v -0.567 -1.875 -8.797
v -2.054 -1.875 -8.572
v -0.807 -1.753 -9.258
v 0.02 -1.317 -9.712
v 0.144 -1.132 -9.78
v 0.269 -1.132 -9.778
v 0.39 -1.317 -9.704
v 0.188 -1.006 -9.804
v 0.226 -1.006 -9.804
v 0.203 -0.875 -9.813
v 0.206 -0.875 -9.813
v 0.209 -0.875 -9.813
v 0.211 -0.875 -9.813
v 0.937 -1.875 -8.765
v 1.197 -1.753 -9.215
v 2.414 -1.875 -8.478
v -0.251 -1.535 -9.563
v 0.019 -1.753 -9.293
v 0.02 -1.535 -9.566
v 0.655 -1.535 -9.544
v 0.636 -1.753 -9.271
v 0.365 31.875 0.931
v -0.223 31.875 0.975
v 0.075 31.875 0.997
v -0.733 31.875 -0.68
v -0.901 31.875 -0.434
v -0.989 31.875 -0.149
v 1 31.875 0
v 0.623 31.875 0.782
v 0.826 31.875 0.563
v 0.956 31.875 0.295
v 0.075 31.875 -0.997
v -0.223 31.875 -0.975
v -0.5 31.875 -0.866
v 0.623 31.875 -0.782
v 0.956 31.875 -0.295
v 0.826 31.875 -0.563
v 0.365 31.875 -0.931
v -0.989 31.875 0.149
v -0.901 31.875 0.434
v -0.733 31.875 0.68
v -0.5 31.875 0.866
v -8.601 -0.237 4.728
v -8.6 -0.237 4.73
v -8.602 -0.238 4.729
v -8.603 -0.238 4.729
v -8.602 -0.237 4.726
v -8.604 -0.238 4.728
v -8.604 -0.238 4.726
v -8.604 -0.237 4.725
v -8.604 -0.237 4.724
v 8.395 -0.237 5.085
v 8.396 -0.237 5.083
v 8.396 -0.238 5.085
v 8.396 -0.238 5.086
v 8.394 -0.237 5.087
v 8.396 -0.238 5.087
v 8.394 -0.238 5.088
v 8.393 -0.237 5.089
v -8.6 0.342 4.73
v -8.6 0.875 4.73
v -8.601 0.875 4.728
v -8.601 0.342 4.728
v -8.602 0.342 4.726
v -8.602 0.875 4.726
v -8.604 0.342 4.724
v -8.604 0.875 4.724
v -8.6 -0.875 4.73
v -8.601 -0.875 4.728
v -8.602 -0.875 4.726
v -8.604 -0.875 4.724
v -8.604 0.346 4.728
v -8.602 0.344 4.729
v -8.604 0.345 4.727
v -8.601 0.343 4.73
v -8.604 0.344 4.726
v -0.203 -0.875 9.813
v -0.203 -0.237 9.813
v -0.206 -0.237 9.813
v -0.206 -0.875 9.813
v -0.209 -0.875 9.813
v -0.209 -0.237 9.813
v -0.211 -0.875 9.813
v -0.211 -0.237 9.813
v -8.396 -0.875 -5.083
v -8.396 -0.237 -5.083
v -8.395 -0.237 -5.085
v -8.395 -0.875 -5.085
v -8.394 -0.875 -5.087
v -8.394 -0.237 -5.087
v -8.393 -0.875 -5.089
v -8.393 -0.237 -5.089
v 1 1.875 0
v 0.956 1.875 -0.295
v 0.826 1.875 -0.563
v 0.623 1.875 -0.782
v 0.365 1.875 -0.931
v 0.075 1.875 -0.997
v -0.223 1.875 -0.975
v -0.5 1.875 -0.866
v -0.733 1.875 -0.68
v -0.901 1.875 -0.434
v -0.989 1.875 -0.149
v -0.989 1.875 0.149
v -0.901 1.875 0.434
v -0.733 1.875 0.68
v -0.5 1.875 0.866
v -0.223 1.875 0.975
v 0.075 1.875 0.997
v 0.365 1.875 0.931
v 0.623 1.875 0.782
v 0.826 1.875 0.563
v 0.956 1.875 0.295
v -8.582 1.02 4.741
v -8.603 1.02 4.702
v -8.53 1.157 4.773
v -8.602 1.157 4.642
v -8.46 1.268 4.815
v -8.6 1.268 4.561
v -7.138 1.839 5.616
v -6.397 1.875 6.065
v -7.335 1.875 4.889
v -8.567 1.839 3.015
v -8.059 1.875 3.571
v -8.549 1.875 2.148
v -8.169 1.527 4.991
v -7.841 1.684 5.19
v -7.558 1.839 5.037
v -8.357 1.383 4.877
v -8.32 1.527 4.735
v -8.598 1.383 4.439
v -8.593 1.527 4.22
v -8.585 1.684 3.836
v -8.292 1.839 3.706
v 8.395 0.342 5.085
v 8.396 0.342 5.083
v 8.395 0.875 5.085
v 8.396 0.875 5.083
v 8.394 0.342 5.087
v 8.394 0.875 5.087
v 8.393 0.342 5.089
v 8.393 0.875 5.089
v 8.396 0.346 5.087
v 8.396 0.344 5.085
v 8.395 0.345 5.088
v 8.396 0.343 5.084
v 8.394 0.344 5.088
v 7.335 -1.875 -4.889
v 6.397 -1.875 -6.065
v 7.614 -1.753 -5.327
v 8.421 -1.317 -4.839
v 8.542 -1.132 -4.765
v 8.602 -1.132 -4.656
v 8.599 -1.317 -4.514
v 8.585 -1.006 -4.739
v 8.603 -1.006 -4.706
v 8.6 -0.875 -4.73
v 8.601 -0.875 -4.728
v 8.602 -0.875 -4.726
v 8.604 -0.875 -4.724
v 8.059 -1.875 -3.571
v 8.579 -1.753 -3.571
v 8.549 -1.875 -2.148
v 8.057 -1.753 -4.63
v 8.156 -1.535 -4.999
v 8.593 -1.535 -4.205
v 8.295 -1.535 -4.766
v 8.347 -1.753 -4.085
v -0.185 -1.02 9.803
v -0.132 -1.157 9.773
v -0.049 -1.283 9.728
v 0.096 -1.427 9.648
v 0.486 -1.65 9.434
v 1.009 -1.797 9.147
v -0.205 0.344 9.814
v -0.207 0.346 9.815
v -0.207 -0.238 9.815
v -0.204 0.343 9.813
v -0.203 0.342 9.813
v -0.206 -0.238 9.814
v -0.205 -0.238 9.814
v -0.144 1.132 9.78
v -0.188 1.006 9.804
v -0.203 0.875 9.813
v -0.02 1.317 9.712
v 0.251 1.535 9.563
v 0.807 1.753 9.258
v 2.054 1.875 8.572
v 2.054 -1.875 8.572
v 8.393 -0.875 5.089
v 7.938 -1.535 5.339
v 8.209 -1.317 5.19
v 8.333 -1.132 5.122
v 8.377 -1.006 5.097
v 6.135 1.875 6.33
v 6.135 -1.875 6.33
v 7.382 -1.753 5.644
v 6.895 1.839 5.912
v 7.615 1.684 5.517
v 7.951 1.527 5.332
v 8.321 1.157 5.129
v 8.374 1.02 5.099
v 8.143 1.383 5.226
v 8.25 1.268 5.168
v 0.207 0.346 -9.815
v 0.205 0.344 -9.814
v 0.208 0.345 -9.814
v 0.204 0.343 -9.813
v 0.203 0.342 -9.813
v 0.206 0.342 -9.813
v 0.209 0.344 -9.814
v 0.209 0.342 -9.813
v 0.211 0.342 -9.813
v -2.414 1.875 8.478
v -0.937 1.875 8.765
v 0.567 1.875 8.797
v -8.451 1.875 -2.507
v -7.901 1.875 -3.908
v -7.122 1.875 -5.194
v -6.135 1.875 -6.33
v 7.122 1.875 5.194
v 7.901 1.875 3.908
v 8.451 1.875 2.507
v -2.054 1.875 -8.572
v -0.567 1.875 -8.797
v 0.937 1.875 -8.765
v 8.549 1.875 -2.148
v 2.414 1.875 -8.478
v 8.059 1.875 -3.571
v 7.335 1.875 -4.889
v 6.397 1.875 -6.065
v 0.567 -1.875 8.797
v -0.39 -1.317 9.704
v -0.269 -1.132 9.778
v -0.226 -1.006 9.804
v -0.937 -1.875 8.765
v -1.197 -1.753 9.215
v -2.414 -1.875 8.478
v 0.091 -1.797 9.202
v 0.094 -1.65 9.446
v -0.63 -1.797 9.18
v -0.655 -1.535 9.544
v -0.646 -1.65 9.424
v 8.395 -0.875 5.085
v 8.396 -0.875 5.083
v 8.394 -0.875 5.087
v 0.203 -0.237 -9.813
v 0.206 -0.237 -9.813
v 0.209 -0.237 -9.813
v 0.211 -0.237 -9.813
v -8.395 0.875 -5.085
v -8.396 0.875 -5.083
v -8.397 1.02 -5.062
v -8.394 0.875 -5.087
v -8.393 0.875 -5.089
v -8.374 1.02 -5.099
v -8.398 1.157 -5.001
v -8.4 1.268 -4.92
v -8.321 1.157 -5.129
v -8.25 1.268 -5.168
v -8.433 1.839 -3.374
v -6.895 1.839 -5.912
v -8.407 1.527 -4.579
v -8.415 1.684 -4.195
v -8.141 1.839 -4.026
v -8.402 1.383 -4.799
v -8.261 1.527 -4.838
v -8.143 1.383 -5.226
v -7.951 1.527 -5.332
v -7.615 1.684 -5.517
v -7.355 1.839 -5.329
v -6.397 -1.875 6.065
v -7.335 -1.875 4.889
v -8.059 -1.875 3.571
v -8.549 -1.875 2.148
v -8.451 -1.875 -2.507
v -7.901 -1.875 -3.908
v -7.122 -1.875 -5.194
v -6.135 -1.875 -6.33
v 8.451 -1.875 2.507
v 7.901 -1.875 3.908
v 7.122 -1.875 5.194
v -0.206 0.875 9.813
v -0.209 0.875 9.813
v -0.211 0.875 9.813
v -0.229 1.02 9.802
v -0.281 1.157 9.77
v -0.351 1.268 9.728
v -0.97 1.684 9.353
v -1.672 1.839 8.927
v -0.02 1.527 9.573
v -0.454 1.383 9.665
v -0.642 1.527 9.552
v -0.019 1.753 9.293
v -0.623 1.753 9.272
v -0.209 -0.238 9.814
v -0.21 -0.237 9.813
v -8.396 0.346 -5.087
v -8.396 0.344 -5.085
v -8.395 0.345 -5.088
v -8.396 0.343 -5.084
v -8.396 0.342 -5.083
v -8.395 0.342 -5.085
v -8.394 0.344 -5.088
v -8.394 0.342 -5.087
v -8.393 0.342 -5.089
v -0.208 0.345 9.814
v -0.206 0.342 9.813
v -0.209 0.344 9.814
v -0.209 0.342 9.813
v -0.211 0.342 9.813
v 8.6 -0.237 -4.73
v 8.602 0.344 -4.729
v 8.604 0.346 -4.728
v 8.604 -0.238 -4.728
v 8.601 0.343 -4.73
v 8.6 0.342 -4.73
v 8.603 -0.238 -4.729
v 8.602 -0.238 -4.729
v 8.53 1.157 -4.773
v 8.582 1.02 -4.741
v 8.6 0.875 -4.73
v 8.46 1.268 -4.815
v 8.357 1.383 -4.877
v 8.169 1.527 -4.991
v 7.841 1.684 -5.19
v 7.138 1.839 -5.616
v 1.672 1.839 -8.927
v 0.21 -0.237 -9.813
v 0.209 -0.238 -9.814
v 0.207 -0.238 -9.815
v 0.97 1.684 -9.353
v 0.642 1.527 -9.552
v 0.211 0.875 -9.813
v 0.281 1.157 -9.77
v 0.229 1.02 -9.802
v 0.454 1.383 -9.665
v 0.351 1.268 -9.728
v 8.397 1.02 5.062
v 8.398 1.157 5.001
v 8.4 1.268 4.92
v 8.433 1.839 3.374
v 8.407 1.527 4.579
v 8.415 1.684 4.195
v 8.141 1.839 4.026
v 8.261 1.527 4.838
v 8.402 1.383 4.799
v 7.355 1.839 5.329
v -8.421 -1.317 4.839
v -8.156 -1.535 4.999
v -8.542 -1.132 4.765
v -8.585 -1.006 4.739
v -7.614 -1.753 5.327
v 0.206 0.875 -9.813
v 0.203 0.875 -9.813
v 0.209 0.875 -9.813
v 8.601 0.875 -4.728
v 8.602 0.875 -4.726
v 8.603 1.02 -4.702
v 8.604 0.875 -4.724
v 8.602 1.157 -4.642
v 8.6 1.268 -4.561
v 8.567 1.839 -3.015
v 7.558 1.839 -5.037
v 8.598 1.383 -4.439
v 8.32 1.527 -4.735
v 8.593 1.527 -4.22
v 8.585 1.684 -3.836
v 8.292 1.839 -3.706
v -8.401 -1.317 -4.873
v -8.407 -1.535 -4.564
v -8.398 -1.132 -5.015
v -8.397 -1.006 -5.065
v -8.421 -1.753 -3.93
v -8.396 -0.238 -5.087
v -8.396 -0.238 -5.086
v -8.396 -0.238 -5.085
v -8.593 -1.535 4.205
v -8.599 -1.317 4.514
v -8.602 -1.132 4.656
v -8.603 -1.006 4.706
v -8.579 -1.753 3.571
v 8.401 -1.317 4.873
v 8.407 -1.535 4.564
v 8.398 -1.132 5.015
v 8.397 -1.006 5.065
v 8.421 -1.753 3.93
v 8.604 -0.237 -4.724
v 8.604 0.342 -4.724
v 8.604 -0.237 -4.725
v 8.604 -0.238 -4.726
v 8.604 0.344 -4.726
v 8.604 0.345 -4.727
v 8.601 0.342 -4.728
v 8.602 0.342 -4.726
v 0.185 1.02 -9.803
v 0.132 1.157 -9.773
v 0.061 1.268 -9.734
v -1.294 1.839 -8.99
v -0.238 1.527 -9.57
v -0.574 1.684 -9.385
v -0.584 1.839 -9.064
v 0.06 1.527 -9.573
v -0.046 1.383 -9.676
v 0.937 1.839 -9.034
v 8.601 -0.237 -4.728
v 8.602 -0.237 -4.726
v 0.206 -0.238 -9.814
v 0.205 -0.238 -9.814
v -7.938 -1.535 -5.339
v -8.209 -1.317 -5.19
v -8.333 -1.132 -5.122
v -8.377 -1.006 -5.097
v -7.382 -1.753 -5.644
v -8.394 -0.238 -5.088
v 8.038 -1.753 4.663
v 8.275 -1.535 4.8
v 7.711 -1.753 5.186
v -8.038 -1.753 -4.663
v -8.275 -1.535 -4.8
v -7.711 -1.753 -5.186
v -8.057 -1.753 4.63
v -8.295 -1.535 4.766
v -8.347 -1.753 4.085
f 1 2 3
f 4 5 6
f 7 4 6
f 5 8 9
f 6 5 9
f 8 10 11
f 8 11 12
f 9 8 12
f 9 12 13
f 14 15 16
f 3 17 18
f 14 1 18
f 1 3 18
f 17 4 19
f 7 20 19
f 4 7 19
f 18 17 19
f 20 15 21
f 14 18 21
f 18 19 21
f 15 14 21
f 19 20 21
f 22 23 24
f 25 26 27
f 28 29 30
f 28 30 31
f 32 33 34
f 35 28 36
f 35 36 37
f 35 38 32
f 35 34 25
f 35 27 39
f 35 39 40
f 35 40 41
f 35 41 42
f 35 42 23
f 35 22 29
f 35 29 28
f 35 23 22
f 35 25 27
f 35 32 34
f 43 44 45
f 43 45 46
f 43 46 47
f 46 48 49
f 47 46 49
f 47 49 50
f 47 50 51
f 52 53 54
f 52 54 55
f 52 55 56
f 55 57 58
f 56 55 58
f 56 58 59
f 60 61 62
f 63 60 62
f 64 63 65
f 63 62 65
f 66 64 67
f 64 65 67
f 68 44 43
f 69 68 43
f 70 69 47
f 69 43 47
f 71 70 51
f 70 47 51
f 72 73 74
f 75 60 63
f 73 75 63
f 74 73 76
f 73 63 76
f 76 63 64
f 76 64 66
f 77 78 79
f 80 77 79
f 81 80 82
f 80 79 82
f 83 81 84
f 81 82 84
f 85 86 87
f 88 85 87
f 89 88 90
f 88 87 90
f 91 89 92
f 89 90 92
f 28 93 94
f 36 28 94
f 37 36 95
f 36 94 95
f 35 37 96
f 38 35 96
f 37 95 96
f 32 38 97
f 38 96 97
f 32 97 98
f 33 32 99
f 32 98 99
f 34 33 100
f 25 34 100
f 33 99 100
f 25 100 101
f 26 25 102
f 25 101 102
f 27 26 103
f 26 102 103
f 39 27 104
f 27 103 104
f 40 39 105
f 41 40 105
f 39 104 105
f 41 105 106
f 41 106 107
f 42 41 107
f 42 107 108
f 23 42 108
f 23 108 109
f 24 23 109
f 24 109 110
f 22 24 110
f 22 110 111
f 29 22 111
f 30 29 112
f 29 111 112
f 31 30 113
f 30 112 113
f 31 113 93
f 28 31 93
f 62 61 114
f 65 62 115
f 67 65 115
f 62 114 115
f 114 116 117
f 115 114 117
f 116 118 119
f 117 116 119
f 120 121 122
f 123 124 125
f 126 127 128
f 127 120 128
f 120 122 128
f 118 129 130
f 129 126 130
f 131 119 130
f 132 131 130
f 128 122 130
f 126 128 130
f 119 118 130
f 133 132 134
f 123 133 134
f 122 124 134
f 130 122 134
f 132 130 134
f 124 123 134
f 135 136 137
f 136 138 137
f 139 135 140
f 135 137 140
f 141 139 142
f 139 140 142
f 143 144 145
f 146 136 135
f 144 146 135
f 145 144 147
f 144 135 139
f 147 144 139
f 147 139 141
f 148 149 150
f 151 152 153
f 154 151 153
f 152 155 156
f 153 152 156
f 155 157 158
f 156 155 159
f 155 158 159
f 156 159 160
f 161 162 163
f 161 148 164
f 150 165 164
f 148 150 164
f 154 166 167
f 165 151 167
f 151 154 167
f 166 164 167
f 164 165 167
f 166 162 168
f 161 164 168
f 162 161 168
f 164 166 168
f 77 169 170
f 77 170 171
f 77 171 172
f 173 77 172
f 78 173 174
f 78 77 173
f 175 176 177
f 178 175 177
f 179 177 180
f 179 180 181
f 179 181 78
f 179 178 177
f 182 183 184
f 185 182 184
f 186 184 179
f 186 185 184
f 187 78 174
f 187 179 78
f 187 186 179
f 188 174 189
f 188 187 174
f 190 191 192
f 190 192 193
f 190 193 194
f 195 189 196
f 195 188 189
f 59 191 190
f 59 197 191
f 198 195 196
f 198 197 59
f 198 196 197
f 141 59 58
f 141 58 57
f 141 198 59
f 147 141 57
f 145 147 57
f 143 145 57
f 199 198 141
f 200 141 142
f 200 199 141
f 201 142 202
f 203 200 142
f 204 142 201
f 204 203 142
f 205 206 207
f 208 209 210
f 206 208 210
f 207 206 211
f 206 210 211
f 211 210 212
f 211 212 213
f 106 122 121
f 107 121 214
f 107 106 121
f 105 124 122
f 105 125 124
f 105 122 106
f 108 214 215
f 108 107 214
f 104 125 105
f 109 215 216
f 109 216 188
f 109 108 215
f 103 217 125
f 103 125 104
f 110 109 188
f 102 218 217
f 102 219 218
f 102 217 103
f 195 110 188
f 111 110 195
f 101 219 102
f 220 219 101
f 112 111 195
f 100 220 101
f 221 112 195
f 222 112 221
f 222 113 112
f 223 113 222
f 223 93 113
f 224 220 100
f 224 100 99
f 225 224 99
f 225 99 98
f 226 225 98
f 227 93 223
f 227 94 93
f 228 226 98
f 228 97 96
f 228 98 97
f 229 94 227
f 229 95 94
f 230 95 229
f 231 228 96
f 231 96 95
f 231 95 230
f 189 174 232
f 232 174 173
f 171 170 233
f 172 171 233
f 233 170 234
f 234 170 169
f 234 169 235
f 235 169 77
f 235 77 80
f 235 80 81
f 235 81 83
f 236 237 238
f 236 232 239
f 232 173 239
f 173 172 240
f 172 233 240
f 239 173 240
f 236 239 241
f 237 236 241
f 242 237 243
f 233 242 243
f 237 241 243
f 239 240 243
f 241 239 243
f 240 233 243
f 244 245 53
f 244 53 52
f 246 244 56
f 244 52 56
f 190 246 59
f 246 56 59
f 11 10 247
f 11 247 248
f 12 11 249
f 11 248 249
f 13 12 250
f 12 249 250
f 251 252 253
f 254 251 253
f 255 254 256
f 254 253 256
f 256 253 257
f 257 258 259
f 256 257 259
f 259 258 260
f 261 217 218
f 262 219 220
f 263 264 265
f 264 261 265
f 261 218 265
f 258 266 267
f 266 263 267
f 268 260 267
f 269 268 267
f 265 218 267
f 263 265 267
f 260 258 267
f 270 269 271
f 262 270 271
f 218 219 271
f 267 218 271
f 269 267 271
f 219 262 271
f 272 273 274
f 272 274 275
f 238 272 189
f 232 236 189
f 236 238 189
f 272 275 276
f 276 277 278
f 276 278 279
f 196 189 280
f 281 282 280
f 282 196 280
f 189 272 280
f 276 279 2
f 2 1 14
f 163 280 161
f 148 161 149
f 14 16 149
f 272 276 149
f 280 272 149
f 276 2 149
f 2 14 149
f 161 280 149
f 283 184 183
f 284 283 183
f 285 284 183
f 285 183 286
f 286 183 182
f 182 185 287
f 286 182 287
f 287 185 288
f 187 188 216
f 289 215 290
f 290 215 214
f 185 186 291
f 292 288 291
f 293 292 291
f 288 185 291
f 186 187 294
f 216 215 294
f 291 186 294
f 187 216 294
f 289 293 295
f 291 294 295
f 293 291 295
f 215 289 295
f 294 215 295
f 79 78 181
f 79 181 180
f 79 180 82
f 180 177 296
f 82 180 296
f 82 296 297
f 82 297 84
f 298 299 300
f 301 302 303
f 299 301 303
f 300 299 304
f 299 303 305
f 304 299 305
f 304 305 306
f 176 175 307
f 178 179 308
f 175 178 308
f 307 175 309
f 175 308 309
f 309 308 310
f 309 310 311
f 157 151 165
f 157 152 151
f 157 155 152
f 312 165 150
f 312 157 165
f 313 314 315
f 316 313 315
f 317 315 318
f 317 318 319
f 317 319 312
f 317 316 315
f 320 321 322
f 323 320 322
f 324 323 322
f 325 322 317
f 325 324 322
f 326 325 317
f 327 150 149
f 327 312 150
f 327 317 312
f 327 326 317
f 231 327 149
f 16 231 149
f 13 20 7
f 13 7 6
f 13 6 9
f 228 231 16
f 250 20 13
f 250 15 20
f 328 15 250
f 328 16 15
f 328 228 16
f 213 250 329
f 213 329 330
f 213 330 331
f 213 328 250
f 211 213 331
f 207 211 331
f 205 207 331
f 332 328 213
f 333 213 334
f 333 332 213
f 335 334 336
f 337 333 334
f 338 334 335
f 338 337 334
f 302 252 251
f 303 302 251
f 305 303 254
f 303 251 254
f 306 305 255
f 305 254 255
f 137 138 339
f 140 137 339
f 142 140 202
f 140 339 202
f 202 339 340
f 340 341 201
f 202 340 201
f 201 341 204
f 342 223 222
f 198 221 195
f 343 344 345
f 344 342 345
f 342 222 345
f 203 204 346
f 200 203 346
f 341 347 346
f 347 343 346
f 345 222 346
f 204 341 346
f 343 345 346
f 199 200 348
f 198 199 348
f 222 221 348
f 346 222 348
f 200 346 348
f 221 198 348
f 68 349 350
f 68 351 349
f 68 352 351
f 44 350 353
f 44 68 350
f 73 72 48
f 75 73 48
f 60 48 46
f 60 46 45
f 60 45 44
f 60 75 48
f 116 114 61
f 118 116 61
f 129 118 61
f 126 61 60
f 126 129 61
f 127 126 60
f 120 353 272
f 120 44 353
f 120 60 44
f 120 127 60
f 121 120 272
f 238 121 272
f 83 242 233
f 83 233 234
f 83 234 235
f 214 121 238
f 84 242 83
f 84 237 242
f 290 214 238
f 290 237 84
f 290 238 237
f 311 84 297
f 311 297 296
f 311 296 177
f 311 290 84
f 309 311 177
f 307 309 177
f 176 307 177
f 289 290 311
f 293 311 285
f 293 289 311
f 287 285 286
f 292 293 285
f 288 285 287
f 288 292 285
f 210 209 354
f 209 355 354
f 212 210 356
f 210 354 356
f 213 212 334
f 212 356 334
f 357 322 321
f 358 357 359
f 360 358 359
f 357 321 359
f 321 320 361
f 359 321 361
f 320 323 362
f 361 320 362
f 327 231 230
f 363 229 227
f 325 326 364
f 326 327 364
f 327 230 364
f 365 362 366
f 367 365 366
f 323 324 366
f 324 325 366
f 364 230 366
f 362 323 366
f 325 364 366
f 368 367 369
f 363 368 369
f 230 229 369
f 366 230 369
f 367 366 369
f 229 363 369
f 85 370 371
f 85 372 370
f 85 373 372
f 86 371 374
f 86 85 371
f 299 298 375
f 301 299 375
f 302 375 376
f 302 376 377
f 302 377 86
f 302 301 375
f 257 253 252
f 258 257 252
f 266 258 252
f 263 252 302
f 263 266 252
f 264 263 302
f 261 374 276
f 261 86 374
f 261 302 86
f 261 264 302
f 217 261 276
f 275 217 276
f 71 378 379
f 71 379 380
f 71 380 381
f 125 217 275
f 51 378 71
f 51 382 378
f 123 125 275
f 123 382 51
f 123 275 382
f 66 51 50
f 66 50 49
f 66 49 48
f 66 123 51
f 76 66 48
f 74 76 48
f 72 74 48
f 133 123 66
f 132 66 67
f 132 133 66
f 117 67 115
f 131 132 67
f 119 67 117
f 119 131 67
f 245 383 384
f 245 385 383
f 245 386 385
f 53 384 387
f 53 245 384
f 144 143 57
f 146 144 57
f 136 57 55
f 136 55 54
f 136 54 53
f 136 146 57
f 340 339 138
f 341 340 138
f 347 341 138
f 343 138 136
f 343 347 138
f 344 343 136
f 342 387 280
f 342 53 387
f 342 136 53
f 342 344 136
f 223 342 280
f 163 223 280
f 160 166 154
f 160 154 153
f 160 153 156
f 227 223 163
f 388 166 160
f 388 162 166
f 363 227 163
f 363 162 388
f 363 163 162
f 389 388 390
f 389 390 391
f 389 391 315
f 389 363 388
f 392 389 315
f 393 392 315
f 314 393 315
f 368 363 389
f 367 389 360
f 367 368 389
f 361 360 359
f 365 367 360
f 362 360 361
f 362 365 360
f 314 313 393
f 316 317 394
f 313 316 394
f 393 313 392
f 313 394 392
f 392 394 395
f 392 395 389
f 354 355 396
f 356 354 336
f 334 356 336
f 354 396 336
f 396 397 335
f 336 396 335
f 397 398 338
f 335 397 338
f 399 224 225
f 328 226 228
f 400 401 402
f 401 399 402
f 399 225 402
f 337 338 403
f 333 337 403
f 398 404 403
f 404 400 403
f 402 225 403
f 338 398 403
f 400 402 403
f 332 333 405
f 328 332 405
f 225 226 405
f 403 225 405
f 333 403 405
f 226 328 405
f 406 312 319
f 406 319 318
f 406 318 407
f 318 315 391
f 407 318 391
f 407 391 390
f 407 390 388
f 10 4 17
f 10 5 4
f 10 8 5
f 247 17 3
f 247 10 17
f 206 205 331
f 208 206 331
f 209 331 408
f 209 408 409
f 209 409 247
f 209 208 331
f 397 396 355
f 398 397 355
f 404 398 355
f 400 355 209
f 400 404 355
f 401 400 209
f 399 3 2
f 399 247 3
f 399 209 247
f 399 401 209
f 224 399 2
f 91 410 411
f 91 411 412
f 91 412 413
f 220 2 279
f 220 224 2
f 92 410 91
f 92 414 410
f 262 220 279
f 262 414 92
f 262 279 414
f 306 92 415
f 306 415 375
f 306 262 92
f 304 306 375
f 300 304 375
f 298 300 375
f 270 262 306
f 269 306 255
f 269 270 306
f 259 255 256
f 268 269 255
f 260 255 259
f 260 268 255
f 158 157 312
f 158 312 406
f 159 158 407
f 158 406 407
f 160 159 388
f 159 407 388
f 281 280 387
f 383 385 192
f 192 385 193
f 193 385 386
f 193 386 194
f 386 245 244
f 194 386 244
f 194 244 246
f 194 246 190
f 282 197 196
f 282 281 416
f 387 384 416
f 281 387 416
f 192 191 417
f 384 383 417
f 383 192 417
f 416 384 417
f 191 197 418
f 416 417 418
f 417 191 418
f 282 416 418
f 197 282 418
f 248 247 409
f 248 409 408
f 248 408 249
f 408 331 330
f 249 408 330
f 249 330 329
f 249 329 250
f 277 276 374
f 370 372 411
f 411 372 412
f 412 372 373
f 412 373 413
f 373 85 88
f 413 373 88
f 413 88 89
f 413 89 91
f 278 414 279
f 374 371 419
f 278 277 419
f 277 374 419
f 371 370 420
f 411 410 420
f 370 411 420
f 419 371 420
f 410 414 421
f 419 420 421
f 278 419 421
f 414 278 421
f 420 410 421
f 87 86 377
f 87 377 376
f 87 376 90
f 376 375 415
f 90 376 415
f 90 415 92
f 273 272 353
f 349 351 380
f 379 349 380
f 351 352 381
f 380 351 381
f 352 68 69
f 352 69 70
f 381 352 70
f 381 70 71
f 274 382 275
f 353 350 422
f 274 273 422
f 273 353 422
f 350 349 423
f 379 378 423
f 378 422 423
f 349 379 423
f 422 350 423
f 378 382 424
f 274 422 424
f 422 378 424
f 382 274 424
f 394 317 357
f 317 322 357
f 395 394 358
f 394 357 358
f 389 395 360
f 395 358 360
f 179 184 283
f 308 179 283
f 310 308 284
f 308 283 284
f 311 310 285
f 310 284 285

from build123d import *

# Parameters (mm, degrees)
BOSS_EXTRUDE1_DEPTH = 1.875
SKETCH2_R           = 1
BOSS_EXTRUDE2_DEPTH = 30


with BuildPart() as part:
    # Sketch1 → Boss-Extrude1 (new body, symmetric)
    with BuildSketch(Plane(origin=(0, 0, 0), x_dir=(1, 0, 0), z_dir=(0, 1, 0))):
        Polygon((8.603650459, 4.727949427), (0.207300918, 9.814954576), (-8.396349541, 5.087005149), (-8.603650459, -4.727949427), (-0.207300918, -9.814954576), (8.396349541, -5.087005149), align=None)
    extrude(amount=BOSS_EXTRUDE1_DEPTH, both=True)

    # Sketch2 → Boss-Extrude2 (add)
    with BuildSketch(Plane(origin=(0, 1.875, 0), x_dir=(1, 0, 0), z_dir=(0, 1, 0))):
        Circle(SKETCH2_R)
    extrude(amount=BOSS_EXTRUDE2_DEPTH)

    # Sketch3 → Cut-Revolve1 (revolve, cut)
    with BuildSketch(Plane(origin=(0, 0, 0), x_dir=(0, 0, -1), z_dir=(1, 0, 0))):
        with BuildLine():
            Line((-7.638983711, -1.875), (-8.814954576, -1.875))
            ThreePointArc((-8.814954576, -1.875), (-9.522061357, -1.582106781), (-9.814954576, -0.875))
            Line((-9.814954576, -0.875), (-9.814954576, -0.236690097))
            Line((-9.814954576, -0.236690097), (-12.690091337, -2.588009386))
            Line((-12.690091337, -2.588009386), (-8.538791087, -3.391496898))
            Line((-8.538791087, -3.391496898), (-7.638983711, -1.875))
        make_face()
        with BuildLine():
            Line((-9.814954576, 0.342296512), (-9.814954576, 0.875))
            ThreePointArc((-9.814954576, 0.875), (-9.522061357, 1.582106781), (-8.814954576, 1.875))
            Line((-8.814954576, 1.875), (-7.819902103, 1.875))
            Line((-7.819902103, 1.875), (-11.754866647, 3.826938138))
            Line((-11.754866647, 3.826938138), (-9.814954576, 0.342296512))
        make_face()
    revolve(axis=Axis((0, 0, 0), (0, -1, 0)), mode=Mode.SUBTRACT)


solid = part.part
